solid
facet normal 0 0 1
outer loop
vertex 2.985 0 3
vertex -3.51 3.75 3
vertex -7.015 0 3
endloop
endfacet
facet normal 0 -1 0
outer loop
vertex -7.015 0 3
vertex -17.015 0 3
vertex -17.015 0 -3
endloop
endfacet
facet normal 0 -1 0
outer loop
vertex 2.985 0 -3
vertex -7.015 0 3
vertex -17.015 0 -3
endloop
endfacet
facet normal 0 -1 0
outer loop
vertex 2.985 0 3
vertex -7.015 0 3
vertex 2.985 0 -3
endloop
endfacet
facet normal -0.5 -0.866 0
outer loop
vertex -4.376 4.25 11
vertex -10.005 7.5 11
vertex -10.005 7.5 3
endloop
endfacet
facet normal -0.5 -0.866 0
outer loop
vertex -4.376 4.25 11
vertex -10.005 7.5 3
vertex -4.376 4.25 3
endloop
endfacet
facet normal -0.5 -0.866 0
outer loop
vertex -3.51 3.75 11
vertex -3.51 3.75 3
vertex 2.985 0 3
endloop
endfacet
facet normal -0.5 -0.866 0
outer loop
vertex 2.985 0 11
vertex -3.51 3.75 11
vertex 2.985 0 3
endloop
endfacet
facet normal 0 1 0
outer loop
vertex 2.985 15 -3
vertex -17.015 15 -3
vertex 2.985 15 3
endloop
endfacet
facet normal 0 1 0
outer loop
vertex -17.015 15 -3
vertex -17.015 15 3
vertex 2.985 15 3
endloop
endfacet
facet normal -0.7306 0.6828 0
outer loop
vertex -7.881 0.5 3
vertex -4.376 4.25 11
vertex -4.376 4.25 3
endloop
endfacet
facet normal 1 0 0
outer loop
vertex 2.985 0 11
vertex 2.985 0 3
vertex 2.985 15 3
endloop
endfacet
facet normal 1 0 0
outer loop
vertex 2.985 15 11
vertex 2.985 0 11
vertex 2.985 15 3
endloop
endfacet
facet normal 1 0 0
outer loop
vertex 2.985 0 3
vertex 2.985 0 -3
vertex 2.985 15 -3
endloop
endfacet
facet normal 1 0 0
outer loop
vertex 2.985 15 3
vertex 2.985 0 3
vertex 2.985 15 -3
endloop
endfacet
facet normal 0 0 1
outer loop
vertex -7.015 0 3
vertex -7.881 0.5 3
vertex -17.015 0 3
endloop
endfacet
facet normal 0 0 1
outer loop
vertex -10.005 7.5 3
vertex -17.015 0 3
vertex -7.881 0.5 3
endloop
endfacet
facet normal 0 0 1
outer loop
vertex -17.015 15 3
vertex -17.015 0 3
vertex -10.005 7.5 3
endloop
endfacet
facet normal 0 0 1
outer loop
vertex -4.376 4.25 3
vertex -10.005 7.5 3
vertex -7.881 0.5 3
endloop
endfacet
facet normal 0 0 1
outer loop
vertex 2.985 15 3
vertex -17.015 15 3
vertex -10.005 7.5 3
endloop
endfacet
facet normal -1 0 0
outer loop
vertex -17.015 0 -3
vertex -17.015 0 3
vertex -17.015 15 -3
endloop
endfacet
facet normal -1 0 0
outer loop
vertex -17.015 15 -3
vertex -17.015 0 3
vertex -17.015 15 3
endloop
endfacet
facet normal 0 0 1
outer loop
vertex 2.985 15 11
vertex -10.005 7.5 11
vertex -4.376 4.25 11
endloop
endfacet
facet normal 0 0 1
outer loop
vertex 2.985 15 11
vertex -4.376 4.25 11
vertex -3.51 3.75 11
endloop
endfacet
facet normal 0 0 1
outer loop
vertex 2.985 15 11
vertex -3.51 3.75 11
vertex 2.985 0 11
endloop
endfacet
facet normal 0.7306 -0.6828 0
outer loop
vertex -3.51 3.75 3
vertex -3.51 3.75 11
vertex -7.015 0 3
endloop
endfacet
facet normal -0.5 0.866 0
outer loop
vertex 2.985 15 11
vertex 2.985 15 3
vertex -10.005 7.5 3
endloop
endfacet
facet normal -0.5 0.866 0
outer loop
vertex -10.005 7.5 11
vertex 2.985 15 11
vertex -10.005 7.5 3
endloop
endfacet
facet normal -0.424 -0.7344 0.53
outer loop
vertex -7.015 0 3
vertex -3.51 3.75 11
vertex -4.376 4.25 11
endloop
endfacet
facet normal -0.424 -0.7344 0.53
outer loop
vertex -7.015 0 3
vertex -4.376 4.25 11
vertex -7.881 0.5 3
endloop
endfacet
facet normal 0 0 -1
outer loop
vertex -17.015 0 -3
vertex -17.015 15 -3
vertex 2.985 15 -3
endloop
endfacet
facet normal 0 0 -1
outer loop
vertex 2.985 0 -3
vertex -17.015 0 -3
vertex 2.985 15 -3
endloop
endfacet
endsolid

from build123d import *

# Parameters (mm, degrees)
SKETCH_1_W      = 20
SKETCH_1_H      = 15
EXTRUDE_1_DEPTH = 3
EXTRUDE_2_DEPTH = 8
EXTRUDE_3_DEPTH = 1


with BuildPart() as part:
    # 草图1 → 凸台-拉伸1 (new, symmetric)
    with BuildSketch(Plane.XY):
        with Locations((-7.014925373, 7.5)):
            Rectangle(SKETCH_1_W, SKETCH_1_H)
    extrude(amount=EXTRUDE_1_DEPTH, both=True)



with BuildPart() as body_2:
    # 草图2 → 凸台-拉伸2 (new body)
    with BuildSketch(Plane.XY.offset(3)):
        Polygon((2.985074627, 0), (2.985074627, 15), (-10.00530643, 7.5), align=None)
    extrude(amount=EXTRUDE_2_DEPTH)


with BuildPart() as part_1:
    add(part.part)

    add(body_2.part)  # 凸台-拉伸3 merges body 2
    # Sketch 3D_1 → 凸台-拉伸3 (add, along a direction that is not the sketch's normal)
    with BuildSketch(Plane(origin=(-3.510115902, 3.75, 11), x_dir=(-0.368730866446014, -0.3945266526955367, -0.8416568590838117), z_dir=(0.7305877107722233, -0.6828188609496683, 0))):
        Polygon((0, 0), (9.505061253, 0), (6.733254873, 4.320101714), align=None)
    extrude(amount=-EXTRUDE_3_DEPTH, dir=(0.8660254037844387, -0.49999999999999983, 0))


solid = part_1.part
